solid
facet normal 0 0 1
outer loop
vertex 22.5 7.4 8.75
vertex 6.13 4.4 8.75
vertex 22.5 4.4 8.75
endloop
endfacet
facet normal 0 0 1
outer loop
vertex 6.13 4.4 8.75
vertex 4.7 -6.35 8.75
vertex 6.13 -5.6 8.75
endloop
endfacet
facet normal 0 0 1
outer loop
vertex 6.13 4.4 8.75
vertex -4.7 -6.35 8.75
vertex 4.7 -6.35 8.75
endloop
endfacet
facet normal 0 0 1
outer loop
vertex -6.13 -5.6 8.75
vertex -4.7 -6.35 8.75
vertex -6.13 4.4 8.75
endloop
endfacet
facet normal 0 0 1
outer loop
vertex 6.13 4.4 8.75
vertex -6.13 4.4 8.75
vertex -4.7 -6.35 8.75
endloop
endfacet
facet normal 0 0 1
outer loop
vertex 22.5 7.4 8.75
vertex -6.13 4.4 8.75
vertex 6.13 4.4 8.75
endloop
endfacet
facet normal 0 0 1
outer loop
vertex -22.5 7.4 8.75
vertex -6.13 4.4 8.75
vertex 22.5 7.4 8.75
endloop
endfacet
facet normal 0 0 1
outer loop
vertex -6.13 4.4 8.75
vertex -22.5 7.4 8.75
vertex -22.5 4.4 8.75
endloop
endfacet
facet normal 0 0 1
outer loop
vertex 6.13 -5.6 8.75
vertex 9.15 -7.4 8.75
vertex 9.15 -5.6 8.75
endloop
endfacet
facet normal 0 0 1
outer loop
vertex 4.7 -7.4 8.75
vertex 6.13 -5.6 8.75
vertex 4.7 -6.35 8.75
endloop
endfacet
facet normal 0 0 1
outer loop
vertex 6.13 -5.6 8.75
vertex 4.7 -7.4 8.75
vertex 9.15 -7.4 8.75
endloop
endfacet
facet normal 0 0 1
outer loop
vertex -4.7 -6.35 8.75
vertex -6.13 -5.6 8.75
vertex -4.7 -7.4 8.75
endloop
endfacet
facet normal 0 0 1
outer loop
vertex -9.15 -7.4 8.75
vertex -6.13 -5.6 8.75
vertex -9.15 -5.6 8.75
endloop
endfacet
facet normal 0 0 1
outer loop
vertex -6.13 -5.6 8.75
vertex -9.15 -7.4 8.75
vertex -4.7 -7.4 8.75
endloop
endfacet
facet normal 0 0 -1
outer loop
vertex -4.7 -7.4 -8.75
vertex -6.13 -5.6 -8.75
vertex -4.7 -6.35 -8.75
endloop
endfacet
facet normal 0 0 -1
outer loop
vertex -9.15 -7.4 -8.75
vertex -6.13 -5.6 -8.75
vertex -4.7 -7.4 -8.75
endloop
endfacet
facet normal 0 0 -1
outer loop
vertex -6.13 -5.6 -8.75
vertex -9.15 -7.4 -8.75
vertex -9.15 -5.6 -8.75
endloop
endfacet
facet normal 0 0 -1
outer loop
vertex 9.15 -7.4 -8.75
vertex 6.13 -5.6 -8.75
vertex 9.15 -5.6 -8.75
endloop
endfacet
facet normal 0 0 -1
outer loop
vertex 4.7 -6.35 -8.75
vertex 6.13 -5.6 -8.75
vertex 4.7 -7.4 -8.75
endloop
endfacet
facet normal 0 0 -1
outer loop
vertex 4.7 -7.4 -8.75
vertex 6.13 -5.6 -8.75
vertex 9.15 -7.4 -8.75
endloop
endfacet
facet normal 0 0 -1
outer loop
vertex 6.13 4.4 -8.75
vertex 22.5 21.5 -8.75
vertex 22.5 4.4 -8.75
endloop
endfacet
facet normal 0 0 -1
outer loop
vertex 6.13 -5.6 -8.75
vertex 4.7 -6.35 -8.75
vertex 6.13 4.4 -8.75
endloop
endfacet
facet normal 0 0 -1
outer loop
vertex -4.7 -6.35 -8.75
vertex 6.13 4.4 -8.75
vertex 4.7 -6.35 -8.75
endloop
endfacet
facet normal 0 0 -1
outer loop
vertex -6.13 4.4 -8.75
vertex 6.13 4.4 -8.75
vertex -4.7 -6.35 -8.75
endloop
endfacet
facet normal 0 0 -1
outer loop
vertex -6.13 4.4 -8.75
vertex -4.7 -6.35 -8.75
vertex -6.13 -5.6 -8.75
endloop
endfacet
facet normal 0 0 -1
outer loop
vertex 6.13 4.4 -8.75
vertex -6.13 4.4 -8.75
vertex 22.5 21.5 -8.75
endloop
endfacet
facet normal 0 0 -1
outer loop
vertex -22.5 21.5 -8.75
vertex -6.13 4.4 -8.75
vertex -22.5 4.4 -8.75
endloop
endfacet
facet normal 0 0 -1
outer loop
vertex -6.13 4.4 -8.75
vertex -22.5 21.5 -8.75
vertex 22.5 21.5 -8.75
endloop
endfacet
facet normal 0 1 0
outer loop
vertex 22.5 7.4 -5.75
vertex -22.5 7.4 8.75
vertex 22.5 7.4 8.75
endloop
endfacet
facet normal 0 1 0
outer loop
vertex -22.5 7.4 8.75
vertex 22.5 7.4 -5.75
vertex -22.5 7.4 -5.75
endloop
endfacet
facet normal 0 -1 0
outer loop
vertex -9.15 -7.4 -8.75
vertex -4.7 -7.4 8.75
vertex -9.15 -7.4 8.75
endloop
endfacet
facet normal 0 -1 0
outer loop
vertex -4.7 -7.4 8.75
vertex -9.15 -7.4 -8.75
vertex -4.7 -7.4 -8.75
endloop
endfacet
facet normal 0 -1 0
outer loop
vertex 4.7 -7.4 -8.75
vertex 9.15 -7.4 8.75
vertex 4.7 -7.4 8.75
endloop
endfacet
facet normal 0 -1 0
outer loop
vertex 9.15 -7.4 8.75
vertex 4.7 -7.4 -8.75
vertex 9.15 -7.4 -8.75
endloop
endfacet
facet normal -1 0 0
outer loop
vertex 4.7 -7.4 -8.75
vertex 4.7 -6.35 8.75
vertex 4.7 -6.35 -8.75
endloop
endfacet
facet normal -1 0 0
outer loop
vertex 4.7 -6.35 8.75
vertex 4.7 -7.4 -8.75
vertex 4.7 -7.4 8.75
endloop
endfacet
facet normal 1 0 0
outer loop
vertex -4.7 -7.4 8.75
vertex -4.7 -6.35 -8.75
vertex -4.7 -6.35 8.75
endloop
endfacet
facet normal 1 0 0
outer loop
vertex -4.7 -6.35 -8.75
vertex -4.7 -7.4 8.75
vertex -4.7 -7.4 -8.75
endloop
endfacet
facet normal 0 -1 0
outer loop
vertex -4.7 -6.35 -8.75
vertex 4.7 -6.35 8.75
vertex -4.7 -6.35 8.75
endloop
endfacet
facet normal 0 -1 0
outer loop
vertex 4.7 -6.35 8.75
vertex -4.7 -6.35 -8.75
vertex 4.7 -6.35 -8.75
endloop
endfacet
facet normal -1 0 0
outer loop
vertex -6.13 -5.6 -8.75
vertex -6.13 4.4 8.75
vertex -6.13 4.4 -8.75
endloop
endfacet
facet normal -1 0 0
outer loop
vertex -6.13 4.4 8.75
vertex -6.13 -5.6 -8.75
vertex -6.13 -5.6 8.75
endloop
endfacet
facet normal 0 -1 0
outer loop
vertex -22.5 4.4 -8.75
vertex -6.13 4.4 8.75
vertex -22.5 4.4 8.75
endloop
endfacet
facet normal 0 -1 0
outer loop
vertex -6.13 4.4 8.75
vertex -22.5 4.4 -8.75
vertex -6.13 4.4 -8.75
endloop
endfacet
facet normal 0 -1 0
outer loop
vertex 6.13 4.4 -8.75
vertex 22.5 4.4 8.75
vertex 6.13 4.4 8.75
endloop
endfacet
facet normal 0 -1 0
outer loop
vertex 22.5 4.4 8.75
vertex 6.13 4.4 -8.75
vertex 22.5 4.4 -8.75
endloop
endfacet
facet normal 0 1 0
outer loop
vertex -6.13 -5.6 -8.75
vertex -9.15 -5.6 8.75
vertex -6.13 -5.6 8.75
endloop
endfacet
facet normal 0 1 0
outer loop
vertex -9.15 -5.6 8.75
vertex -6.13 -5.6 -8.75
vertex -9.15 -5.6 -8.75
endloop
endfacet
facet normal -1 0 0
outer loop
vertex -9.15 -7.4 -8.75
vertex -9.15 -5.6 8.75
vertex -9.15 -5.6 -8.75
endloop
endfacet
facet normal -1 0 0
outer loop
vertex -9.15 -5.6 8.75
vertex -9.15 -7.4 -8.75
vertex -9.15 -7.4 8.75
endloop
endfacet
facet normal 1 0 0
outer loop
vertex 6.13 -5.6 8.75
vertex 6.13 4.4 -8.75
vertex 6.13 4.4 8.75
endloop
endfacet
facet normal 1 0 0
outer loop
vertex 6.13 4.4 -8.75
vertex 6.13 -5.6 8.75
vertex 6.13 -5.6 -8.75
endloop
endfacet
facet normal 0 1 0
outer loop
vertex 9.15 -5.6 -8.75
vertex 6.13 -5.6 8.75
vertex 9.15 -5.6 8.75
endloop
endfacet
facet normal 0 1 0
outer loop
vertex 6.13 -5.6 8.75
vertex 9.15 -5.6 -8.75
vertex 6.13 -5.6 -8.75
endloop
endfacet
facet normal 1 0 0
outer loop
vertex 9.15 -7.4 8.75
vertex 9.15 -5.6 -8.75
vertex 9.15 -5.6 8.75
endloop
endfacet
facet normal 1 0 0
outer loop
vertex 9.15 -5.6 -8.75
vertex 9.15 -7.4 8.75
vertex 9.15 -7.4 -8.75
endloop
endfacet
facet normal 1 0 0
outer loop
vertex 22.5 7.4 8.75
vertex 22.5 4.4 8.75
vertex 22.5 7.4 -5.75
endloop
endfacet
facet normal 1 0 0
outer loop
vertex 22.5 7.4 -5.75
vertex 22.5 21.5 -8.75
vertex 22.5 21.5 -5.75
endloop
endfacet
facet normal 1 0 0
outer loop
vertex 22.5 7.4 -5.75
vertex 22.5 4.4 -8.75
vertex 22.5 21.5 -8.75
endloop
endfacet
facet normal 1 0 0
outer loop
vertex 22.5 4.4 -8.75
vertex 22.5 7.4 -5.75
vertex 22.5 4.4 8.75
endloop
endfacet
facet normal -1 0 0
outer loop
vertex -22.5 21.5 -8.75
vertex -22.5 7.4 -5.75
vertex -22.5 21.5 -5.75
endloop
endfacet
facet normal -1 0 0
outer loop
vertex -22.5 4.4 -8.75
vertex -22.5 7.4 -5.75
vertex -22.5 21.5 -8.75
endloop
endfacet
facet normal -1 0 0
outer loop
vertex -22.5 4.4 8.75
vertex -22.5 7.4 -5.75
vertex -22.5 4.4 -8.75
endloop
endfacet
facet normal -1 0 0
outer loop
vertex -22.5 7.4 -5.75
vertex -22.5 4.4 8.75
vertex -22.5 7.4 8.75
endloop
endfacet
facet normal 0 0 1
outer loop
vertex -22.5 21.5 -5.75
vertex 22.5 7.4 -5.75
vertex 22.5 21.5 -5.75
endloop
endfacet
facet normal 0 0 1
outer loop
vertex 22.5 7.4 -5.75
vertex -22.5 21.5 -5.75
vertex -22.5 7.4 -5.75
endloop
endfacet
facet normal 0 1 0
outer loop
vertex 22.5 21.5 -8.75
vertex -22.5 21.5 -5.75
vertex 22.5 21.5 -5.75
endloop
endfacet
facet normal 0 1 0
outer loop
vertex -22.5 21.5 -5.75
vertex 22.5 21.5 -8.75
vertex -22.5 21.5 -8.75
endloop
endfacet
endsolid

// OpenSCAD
hotshoemount();

module hotshoemount() {

    // Base
    translate([0,5.9,0]) 
    cube([45,3,17.5], center=true);
    translate([0,14,-7.25]) 
    cube([45,15,3], center=true);

	difference() {

		cube([20,14.8,17.5], center=true);

		translate([0,-7.6,0]) {
			cube([9.4,2.5,18], center=true);
		}
	
		translate([-8.125,-0.60,0]) {
			cube([3.99,10,18], center=true);
		}
	
		translate([-9.65,-6.5,0]) {
			cube([1,2,18], center=true);
		}
	
	
		translate([8.125,-0.60,0]) {
			cube([3.99,10,18], center=true);
		}
	
		translate([9.65,-6.5,0]) {
			cube([1,2,18], center=true);
		}

	}


}
